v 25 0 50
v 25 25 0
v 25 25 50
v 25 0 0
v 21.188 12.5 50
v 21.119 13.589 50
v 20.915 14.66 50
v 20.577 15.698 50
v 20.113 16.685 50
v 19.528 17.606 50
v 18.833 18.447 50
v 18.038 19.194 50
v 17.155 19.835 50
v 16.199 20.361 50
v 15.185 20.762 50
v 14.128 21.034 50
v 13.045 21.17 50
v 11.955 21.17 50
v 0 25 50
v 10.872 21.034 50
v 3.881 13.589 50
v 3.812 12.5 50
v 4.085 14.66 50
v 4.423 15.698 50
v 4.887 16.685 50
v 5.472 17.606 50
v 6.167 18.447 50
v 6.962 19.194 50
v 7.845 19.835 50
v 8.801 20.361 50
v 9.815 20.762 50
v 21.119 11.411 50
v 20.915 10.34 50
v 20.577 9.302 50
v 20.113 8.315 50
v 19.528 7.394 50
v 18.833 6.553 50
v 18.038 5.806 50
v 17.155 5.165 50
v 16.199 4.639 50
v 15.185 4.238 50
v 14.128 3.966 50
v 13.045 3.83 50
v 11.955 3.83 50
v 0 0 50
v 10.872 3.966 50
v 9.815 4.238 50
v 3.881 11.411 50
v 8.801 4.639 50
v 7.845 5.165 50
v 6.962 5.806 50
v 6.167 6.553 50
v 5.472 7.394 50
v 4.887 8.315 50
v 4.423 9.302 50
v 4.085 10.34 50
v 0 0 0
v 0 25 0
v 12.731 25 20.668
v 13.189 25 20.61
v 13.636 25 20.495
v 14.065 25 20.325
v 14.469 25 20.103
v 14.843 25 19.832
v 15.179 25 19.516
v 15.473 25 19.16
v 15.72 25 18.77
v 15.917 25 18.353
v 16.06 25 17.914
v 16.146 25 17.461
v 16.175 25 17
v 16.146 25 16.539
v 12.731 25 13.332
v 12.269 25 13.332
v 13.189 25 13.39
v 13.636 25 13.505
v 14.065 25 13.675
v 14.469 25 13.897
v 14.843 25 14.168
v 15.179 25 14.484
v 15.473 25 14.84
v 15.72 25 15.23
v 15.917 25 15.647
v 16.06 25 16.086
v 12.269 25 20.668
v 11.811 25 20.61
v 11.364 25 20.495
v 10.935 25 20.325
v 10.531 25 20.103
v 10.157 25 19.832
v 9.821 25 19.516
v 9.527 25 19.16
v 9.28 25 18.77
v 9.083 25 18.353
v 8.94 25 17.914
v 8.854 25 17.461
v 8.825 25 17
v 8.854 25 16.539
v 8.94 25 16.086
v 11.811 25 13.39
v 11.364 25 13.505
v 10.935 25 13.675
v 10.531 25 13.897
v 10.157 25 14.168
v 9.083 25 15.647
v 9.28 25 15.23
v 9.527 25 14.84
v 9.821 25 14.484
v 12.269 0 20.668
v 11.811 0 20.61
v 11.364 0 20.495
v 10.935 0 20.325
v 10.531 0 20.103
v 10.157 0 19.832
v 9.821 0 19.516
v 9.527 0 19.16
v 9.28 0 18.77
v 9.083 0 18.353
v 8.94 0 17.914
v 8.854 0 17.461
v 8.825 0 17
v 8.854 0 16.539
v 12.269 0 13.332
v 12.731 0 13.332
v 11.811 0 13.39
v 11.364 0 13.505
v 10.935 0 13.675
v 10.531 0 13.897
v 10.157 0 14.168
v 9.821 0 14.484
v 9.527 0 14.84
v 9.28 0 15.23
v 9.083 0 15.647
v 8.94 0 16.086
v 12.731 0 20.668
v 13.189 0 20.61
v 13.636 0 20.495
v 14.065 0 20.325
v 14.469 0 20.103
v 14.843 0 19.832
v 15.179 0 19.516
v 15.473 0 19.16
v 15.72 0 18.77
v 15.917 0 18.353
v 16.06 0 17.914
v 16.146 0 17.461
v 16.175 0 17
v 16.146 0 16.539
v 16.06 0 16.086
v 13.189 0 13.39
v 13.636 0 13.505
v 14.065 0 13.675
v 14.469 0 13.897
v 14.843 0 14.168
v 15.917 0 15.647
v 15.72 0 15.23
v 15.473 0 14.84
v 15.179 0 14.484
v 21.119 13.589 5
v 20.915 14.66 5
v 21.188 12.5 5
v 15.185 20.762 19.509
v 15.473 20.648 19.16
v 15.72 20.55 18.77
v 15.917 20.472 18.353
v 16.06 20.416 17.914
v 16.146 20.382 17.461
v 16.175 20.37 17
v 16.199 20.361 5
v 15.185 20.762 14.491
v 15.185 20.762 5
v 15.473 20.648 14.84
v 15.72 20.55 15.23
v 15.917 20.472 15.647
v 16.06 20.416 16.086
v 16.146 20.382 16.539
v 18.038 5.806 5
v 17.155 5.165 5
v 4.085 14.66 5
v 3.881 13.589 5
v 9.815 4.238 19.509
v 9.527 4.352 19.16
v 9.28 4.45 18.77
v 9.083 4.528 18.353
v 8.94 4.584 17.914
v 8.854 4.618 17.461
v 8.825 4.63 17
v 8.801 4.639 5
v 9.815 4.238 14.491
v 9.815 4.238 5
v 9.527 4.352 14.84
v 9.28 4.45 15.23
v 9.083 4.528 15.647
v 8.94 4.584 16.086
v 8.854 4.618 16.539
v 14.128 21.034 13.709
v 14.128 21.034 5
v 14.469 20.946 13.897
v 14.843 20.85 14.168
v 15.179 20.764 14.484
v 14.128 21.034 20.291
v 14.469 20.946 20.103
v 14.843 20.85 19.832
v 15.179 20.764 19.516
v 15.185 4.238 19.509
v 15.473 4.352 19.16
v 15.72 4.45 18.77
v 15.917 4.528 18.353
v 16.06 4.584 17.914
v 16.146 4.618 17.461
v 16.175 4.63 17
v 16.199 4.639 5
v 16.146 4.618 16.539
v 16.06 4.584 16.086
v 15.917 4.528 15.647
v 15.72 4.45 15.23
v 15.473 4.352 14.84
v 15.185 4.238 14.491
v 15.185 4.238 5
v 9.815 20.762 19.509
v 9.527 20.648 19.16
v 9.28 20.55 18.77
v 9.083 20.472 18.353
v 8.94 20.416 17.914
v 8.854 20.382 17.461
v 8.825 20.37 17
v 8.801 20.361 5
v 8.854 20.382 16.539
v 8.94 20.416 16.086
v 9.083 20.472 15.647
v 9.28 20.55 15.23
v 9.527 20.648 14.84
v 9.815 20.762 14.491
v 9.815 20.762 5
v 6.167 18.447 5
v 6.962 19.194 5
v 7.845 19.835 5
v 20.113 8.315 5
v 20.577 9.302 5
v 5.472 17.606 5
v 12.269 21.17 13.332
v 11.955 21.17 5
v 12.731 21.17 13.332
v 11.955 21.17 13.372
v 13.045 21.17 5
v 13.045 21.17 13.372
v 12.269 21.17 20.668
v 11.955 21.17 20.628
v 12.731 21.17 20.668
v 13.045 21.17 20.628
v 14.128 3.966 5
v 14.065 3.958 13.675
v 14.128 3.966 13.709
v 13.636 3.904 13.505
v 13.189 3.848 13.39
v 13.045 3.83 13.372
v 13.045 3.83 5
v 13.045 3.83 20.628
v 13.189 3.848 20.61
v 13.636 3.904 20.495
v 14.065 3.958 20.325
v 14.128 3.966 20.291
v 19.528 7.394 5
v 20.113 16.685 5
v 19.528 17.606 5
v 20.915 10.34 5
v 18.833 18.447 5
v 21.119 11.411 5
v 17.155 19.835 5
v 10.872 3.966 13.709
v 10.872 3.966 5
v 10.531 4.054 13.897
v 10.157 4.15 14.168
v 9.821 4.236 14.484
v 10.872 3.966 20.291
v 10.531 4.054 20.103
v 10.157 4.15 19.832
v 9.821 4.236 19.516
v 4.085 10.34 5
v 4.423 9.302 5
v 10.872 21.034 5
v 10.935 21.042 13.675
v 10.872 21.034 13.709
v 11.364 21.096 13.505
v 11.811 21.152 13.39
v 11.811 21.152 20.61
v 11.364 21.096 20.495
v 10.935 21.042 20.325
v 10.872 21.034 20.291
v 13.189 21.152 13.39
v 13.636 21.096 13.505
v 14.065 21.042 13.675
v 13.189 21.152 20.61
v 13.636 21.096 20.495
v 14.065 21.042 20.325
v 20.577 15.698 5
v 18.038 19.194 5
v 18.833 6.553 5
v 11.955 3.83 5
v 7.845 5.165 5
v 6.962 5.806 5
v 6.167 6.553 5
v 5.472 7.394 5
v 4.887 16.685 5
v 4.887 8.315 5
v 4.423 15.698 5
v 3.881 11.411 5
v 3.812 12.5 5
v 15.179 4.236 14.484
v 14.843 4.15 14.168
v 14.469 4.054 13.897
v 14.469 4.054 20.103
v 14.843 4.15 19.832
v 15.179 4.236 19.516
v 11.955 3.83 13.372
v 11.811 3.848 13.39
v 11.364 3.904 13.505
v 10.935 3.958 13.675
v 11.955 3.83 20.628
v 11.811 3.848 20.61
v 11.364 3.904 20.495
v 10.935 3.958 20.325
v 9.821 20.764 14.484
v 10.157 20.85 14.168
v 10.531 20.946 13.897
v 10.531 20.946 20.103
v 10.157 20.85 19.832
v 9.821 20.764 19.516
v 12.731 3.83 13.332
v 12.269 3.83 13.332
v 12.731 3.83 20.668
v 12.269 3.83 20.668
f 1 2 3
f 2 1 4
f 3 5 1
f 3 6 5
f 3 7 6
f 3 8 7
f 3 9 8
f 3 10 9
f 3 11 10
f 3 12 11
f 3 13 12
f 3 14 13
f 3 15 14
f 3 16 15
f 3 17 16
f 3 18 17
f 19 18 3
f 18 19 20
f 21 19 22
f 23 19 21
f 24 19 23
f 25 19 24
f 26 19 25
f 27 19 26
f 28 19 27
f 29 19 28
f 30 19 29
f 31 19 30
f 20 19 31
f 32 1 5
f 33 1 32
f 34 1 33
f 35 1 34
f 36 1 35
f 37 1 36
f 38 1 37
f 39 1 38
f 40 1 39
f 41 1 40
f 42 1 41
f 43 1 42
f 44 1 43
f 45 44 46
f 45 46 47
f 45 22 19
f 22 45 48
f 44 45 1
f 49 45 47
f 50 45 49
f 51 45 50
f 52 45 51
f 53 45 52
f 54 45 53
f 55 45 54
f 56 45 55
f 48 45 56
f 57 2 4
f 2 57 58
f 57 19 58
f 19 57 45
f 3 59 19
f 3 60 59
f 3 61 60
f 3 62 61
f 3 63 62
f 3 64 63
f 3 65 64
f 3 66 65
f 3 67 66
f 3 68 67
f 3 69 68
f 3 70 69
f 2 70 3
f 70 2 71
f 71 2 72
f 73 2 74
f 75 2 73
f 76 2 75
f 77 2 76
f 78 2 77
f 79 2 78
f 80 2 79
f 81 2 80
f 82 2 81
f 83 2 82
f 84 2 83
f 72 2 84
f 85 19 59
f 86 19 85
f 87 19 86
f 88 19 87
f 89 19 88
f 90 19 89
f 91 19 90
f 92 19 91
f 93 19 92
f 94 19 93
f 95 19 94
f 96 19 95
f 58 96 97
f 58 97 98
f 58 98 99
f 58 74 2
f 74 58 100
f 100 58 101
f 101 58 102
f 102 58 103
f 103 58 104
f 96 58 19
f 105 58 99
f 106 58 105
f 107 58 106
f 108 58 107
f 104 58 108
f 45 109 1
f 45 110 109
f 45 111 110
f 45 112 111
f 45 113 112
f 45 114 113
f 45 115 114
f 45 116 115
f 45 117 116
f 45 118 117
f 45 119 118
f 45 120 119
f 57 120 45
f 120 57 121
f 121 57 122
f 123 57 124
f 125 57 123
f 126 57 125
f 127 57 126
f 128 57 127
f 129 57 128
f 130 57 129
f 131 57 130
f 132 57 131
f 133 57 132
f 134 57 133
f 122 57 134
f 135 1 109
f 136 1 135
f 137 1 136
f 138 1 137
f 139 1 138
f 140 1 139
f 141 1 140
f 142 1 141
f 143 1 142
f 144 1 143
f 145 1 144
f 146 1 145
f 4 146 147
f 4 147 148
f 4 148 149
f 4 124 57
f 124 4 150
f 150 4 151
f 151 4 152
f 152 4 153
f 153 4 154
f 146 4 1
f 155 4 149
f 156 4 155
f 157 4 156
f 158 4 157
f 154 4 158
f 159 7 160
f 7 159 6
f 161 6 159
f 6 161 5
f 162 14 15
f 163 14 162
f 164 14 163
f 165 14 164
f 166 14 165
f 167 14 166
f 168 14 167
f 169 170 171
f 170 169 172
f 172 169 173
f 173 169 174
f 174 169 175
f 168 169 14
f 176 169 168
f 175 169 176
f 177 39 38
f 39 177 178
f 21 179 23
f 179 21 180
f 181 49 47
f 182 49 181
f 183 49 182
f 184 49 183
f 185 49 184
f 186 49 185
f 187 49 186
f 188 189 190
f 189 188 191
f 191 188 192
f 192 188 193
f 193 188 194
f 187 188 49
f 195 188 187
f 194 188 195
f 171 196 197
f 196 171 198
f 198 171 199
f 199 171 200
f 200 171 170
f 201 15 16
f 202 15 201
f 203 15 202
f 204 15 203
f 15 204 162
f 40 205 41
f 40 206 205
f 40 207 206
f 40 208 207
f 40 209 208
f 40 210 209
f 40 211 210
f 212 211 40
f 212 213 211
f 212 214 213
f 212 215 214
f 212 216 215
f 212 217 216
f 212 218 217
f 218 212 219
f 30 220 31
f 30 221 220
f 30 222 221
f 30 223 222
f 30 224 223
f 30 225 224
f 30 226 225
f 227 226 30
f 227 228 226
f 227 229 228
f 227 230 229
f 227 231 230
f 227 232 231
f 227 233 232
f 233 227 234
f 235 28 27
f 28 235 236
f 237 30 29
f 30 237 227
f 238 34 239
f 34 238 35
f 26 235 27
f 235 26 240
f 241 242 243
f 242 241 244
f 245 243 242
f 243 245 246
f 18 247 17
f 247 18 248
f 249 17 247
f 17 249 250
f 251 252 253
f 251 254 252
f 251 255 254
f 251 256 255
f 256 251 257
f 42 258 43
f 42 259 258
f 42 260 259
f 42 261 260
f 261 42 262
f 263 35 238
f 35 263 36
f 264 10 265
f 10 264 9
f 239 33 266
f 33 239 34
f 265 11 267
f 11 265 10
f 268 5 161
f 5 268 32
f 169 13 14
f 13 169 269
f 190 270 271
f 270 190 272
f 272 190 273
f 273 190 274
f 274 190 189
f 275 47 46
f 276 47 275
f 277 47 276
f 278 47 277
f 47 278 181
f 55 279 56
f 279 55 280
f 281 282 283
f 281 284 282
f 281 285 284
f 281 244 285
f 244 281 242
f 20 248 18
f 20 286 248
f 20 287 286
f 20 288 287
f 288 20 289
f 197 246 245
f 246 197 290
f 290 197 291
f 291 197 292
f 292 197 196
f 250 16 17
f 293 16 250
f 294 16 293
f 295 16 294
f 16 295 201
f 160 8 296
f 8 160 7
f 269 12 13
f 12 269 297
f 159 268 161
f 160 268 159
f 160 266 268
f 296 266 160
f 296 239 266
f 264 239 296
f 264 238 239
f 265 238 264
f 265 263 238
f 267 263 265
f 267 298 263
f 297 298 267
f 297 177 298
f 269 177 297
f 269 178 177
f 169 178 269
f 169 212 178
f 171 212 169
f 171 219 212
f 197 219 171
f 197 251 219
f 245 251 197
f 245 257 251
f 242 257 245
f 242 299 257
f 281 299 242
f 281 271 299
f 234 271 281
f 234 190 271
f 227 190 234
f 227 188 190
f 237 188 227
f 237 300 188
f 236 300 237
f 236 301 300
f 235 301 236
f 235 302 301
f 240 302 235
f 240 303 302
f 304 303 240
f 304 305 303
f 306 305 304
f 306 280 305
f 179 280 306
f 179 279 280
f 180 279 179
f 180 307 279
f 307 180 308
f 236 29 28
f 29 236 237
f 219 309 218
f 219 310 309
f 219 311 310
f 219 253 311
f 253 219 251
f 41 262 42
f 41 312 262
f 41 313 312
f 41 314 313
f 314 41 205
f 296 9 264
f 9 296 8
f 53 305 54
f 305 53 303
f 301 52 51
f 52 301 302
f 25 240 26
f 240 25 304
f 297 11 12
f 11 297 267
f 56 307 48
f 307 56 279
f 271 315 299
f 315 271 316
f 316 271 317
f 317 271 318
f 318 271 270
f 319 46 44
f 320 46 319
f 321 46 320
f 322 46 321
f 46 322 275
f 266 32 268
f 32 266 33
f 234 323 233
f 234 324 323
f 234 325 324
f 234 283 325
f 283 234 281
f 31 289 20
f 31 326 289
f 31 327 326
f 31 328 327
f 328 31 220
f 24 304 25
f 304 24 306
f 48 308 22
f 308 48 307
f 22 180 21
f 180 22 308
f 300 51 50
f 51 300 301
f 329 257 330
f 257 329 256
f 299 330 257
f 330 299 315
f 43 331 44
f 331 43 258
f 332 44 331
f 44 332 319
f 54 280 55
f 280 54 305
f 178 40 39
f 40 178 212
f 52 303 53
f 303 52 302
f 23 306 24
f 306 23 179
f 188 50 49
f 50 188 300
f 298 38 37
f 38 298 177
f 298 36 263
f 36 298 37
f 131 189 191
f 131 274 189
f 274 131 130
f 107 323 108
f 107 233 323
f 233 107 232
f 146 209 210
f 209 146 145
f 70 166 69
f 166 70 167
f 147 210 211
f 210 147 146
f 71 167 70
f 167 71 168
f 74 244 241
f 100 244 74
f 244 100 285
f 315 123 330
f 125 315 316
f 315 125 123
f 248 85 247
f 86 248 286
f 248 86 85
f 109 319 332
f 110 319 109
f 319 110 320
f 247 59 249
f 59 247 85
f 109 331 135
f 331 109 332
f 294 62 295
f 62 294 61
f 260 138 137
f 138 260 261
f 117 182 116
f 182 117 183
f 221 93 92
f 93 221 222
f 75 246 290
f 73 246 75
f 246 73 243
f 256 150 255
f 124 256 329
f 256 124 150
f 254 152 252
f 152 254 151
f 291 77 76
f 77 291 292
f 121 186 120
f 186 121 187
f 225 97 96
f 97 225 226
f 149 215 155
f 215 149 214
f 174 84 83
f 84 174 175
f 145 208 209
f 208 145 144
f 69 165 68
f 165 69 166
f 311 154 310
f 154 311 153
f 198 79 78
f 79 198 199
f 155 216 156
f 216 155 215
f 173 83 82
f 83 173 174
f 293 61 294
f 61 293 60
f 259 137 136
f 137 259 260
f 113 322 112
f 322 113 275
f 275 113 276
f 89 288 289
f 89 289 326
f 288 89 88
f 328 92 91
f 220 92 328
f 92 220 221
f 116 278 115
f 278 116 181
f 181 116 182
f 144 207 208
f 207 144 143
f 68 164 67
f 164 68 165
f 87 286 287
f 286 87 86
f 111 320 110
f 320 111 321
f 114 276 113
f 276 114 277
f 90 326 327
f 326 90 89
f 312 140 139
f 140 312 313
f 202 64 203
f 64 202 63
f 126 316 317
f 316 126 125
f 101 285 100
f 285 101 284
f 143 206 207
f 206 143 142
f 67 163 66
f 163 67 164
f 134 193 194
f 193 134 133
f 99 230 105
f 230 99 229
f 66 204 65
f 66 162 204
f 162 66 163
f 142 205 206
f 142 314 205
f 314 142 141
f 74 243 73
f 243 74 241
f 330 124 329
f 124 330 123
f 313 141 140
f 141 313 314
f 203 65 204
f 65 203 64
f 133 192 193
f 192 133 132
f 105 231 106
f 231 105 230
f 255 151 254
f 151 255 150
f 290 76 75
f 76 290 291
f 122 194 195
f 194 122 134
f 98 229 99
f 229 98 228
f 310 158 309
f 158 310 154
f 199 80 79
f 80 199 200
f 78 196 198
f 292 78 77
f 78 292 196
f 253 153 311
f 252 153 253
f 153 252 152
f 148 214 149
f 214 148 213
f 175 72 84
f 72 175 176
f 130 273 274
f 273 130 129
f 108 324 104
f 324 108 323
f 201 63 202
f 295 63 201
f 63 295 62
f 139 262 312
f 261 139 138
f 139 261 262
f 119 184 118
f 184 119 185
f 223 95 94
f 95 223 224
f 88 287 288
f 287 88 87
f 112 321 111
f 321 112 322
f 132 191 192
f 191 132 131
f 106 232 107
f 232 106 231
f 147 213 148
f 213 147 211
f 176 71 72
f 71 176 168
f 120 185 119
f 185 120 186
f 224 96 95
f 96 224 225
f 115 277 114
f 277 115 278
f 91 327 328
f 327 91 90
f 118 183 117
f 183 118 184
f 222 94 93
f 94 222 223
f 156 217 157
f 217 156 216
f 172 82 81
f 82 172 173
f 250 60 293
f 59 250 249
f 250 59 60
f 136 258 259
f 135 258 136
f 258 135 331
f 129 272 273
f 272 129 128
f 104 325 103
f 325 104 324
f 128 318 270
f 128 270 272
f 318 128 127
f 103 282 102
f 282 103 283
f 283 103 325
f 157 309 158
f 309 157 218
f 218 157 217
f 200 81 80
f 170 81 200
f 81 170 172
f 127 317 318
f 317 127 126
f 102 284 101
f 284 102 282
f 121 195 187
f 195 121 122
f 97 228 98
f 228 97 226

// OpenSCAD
difference()
{
    cube(size=[25,25,50]);
    
    translate([12.5,12.5,5])
    cylinder(d=15.875 + 1.5,h=50-5+.01,$fn=50);
    
    translate([12.5,25.01,12 + 5])
    rotate([90,0,0])
    cylinder(d=6.35 + 1,h=25+.02,$fn=50);
}
